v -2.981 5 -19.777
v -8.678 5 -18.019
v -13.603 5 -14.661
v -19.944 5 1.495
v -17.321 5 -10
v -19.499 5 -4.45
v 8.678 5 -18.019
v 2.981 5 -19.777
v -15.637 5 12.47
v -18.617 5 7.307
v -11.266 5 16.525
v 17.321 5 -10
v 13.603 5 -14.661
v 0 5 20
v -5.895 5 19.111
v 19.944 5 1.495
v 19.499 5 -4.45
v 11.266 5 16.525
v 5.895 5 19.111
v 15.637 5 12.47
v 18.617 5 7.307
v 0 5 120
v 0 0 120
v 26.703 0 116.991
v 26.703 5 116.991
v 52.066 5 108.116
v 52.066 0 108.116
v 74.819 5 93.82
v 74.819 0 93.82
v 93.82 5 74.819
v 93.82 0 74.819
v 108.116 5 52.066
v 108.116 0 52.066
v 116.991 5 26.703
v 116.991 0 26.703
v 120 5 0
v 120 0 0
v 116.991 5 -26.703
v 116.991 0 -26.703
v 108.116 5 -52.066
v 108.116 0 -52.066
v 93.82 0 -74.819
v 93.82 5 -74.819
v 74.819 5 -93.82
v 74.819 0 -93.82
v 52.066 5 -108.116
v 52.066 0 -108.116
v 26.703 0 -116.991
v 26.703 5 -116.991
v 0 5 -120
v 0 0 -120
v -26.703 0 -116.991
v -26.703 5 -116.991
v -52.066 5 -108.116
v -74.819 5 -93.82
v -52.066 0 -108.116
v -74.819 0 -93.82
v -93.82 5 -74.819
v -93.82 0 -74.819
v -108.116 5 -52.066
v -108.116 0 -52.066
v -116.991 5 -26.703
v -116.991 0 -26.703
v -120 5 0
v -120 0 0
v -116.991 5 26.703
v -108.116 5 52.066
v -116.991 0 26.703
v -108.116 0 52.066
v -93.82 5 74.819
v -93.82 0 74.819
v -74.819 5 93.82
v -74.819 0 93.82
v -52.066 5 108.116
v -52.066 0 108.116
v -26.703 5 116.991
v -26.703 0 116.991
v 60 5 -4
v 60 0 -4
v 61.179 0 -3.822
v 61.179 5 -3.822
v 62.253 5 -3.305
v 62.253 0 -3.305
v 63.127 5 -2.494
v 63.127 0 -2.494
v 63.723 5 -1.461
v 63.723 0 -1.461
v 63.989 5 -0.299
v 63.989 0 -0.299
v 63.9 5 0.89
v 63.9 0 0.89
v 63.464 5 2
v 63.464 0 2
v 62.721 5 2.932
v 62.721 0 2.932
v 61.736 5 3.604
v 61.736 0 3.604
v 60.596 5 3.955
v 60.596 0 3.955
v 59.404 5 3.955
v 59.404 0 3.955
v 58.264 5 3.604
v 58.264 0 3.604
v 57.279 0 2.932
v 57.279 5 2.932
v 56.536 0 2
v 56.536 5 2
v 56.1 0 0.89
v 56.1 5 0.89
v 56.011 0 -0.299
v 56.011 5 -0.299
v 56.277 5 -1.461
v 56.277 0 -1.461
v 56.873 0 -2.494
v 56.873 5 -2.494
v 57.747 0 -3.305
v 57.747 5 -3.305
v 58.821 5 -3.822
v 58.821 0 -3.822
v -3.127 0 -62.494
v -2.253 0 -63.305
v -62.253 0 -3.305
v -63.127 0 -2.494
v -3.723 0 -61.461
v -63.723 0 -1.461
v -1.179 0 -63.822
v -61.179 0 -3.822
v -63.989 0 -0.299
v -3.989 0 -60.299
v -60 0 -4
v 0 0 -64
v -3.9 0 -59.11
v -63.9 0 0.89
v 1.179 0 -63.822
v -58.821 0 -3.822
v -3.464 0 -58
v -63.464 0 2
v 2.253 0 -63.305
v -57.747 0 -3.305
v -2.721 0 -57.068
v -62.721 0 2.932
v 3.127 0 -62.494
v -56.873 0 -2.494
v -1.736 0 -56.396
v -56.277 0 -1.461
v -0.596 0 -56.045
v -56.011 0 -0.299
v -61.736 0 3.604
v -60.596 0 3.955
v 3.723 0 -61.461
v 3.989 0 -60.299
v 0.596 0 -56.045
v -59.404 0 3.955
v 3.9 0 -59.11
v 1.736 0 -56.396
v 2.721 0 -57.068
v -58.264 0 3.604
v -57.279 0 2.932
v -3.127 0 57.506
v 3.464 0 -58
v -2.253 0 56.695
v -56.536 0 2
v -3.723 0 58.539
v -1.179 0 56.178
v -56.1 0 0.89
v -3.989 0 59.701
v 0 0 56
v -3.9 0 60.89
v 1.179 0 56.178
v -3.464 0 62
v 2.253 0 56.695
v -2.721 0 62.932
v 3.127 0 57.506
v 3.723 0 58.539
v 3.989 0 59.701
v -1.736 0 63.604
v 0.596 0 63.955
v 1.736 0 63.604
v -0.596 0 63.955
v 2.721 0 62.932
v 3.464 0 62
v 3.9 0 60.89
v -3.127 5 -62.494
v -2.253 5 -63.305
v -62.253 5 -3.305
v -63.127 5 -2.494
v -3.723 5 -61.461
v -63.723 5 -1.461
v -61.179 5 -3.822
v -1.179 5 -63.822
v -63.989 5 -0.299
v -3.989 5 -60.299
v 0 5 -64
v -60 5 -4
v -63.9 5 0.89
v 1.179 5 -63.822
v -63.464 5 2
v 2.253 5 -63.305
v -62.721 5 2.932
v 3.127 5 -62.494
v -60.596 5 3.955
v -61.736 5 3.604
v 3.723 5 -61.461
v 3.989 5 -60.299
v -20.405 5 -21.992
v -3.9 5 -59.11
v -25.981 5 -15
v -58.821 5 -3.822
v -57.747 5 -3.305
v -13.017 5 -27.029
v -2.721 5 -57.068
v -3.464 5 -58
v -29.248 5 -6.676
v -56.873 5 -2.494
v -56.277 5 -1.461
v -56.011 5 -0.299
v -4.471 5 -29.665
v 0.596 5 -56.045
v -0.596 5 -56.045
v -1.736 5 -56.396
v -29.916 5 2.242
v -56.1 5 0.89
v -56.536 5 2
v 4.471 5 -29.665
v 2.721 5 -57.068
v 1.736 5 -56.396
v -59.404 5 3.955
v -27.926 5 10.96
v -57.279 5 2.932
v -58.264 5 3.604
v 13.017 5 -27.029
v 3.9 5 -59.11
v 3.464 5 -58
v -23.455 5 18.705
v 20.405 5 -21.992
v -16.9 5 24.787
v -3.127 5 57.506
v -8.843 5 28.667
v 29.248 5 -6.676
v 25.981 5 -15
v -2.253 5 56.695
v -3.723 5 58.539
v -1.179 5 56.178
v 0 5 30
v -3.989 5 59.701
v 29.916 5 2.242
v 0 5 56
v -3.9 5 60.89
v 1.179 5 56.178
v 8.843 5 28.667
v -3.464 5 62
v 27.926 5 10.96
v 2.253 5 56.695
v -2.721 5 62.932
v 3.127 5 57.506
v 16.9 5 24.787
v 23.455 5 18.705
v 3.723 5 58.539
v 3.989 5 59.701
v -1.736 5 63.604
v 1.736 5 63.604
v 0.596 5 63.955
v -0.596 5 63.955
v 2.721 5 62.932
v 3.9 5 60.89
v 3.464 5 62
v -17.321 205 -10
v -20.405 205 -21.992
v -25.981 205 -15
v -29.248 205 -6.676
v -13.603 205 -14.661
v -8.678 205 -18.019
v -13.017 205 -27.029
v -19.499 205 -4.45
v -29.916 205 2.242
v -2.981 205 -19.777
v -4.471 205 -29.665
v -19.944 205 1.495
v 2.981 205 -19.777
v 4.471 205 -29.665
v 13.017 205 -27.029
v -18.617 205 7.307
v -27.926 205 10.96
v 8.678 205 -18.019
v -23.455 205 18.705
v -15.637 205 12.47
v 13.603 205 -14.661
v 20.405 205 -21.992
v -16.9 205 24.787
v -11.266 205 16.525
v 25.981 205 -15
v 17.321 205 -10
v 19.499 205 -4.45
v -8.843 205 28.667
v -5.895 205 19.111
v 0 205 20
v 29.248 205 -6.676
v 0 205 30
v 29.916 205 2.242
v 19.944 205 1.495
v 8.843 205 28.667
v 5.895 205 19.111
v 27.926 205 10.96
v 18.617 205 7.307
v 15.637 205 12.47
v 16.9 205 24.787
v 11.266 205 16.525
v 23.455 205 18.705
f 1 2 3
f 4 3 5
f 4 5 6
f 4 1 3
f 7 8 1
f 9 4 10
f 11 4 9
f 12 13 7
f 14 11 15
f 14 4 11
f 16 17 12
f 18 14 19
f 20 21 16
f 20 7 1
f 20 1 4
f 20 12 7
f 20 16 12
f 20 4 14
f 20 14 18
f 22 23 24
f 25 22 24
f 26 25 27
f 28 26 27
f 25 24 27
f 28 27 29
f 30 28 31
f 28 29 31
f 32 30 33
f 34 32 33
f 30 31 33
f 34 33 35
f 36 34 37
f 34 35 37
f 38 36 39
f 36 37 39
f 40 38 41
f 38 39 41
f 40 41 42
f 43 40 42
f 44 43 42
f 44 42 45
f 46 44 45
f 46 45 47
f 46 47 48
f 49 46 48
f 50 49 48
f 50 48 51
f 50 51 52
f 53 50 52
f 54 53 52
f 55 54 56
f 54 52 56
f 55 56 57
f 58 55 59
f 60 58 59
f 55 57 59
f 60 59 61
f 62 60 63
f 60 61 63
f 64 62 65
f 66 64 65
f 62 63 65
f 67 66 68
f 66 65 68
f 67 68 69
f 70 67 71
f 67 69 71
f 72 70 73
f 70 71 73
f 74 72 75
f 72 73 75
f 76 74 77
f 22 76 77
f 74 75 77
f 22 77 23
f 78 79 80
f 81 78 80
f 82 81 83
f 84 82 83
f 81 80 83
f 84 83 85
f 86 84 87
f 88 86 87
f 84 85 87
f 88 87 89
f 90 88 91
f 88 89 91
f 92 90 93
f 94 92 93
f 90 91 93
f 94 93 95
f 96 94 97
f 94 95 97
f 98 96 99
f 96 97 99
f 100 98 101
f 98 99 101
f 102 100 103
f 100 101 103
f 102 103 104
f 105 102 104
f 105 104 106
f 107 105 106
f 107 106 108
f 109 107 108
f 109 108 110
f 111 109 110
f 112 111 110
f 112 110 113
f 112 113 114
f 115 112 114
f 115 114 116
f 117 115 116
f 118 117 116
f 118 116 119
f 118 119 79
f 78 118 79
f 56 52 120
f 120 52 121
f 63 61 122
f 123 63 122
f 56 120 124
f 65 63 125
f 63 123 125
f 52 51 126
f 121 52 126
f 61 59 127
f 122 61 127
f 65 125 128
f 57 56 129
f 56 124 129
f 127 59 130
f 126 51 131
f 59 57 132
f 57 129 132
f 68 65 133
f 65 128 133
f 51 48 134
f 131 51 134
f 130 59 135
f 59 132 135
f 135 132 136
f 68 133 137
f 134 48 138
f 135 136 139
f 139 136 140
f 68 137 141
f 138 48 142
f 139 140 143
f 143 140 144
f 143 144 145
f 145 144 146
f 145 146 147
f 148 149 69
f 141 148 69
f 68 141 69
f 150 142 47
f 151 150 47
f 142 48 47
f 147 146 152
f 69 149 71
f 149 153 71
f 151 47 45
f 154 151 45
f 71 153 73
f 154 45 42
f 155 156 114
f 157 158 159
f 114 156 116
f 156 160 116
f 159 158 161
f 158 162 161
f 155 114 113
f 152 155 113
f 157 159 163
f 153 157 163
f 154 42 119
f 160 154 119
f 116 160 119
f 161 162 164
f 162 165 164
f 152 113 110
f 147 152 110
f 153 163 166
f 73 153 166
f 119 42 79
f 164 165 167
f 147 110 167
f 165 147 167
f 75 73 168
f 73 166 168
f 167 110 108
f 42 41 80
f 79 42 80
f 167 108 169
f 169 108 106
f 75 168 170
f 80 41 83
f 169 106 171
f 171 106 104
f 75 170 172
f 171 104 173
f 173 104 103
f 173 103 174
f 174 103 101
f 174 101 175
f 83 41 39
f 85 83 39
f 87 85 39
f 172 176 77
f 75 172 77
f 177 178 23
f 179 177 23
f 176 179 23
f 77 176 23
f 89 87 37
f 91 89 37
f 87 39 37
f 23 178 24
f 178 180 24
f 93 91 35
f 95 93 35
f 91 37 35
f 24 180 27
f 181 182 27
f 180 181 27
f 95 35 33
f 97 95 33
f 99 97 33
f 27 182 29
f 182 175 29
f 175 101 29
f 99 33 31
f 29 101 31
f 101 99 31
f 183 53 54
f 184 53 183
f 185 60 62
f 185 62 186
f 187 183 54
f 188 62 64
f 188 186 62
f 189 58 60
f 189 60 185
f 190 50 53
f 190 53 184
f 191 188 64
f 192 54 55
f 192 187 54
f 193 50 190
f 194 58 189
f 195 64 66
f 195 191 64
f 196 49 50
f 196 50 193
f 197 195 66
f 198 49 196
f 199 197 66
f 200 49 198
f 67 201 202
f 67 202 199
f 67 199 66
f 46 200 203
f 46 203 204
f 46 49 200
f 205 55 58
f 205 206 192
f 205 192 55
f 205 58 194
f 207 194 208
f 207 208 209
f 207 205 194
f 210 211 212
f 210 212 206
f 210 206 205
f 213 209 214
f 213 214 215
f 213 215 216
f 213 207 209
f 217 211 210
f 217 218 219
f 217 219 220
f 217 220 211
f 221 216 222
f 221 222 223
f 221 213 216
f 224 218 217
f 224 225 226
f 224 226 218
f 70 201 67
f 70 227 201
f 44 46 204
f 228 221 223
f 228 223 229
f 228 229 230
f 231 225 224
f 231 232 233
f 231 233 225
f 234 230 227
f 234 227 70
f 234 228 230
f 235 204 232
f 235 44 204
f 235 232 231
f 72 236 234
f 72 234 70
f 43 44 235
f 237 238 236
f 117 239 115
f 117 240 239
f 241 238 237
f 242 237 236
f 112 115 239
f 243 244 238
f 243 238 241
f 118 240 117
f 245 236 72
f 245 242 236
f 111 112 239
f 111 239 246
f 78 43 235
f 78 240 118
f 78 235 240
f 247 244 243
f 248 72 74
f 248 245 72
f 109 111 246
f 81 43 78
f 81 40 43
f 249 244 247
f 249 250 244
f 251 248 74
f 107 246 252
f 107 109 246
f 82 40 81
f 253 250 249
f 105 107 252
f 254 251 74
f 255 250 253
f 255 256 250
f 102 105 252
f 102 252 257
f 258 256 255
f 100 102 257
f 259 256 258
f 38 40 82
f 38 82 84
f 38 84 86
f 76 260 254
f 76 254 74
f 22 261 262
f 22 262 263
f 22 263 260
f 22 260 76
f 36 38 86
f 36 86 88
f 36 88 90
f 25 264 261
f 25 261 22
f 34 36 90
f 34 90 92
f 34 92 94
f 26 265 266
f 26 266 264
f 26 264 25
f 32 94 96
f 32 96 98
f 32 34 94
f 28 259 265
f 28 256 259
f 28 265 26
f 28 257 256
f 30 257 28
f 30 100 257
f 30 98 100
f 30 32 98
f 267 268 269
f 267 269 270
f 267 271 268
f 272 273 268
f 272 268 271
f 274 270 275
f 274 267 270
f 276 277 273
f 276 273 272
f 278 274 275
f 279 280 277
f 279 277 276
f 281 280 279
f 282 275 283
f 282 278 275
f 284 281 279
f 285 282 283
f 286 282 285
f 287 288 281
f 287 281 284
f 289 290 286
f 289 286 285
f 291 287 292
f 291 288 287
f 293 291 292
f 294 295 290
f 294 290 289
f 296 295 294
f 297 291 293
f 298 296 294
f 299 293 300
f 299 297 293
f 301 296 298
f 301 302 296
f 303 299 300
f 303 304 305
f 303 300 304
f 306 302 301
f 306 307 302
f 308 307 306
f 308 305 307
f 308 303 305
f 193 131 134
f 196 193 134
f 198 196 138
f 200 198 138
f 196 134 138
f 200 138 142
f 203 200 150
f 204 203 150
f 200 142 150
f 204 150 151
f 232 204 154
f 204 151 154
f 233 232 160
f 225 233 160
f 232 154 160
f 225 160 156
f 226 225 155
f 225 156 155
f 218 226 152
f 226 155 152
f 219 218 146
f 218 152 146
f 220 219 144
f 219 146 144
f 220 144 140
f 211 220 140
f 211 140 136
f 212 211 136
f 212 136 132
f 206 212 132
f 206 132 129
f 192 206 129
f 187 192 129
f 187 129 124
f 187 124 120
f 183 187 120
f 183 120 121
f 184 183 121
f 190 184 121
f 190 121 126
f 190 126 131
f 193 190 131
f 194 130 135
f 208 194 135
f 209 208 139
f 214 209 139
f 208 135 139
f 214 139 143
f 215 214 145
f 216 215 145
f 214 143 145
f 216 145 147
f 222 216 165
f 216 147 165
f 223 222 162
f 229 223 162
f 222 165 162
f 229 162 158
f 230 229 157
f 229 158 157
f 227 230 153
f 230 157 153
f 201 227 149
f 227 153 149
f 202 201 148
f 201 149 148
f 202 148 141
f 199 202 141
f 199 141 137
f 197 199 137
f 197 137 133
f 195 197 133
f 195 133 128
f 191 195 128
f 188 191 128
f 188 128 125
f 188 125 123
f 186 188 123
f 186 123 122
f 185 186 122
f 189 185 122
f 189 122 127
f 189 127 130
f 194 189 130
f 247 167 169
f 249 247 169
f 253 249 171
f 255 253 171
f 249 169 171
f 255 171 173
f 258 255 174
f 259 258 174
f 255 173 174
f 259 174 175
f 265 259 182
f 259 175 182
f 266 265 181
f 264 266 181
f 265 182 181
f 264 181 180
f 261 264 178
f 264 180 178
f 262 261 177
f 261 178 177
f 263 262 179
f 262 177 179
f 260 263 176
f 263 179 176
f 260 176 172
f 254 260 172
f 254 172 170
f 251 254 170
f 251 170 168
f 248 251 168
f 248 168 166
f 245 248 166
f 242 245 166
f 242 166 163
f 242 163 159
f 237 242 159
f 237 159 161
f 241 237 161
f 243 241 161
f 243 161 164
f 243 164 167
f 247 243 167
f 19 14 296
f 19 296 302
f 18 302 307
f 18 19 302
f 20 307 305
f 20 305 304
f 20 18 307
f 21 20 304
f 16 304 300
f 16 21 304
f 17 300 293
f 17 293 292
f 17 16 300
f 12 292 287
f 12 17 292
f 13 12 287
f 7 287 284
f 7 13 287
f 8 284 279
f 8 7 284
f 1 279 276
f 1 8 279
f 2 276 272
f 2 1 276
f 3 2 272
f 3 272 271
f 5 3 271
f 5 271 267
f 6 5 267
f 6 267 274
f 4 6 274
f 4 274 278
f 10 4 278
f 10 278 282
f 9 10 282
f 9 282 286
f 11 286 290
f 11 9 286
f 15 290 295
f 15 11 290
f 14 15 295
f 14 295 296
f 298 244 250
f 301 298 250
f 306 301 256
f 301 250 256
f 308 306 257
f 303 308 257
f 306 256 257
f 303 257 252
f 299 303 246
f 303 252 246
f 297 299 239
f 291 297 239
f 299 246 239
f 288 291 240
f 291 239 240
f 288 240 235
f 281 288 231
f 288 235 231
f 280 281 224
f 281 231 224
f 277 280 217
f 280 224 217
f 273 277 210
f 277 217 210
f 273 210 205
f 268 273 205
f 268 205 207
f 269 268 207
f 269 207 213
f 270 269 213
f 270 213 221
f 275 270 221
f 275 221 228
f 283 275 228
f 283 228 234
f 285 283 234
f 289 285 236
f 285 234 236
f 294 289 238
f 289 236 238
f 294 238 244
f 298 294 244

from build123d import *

# Parameters (mm, degrees)
SKETCH_1_R      = 120
EXTRUDE_1_DEPTH = 5
MM_2_D          = 8
MM_2_DEPTH      = 20
MM_2_TIP        = 2.403442476
SKETCH_6_R      = 30
SKETCH_6_R_2    = 20
EXTRUDE_2_DEPTH = 200


with BuildPart() as part:
    # 草图1 → 凸台-拉伸1 (new body)
    with BuildSketch(Plane(origin=(0, 0, 0), x_dir=(1, 0, 0), z_dir=(0, 1, 0))):
        with Locations(Location((0, 0, 0), (0, 0, 270))):
            Circle(SKETCH_1_R)
    extrude(amount=EXTRUDE_1_DEPTH)

    # 大小mm 暗销孔2
    with Locations(Plane(origin=(0, 5, -60), x_dir=(0, 0, 1), z_dir=(0, 1, 0))):
        with Locations((0, 0), (60, -60), (120, 0), (60, 60)):
            Hole(MM_2_D / 2, depth=MM_2_DEPTH)
            with Locations((0, 0, -(MM_2_DEPTH + MM_2_TIP / 2))):  # 118° drill point
                Cone(0, MM_2_D / 2, MM_2_TIP, mode=Mode.SUBTRACT)

    # 草图6 → 凸台-拉伸2 (add)
    with BuildSketch(Plane(origin=(0, 5, 0), x_dir=(1, 0, 0), z_dir=(0, 1, 0))):
        with Locations(Location((0, 0, 0), (0, 0, 270))):
            Circle(SKETCH_6_R)
        with Locations(Location((0, 0, 0), (0, 0, 270))):
            Circle(SKETCH_6_R_2, mode=Mode.SUBTRACT)
    extrude(amount=EXTRUDE_2_DEPTH)


solid = part.part
